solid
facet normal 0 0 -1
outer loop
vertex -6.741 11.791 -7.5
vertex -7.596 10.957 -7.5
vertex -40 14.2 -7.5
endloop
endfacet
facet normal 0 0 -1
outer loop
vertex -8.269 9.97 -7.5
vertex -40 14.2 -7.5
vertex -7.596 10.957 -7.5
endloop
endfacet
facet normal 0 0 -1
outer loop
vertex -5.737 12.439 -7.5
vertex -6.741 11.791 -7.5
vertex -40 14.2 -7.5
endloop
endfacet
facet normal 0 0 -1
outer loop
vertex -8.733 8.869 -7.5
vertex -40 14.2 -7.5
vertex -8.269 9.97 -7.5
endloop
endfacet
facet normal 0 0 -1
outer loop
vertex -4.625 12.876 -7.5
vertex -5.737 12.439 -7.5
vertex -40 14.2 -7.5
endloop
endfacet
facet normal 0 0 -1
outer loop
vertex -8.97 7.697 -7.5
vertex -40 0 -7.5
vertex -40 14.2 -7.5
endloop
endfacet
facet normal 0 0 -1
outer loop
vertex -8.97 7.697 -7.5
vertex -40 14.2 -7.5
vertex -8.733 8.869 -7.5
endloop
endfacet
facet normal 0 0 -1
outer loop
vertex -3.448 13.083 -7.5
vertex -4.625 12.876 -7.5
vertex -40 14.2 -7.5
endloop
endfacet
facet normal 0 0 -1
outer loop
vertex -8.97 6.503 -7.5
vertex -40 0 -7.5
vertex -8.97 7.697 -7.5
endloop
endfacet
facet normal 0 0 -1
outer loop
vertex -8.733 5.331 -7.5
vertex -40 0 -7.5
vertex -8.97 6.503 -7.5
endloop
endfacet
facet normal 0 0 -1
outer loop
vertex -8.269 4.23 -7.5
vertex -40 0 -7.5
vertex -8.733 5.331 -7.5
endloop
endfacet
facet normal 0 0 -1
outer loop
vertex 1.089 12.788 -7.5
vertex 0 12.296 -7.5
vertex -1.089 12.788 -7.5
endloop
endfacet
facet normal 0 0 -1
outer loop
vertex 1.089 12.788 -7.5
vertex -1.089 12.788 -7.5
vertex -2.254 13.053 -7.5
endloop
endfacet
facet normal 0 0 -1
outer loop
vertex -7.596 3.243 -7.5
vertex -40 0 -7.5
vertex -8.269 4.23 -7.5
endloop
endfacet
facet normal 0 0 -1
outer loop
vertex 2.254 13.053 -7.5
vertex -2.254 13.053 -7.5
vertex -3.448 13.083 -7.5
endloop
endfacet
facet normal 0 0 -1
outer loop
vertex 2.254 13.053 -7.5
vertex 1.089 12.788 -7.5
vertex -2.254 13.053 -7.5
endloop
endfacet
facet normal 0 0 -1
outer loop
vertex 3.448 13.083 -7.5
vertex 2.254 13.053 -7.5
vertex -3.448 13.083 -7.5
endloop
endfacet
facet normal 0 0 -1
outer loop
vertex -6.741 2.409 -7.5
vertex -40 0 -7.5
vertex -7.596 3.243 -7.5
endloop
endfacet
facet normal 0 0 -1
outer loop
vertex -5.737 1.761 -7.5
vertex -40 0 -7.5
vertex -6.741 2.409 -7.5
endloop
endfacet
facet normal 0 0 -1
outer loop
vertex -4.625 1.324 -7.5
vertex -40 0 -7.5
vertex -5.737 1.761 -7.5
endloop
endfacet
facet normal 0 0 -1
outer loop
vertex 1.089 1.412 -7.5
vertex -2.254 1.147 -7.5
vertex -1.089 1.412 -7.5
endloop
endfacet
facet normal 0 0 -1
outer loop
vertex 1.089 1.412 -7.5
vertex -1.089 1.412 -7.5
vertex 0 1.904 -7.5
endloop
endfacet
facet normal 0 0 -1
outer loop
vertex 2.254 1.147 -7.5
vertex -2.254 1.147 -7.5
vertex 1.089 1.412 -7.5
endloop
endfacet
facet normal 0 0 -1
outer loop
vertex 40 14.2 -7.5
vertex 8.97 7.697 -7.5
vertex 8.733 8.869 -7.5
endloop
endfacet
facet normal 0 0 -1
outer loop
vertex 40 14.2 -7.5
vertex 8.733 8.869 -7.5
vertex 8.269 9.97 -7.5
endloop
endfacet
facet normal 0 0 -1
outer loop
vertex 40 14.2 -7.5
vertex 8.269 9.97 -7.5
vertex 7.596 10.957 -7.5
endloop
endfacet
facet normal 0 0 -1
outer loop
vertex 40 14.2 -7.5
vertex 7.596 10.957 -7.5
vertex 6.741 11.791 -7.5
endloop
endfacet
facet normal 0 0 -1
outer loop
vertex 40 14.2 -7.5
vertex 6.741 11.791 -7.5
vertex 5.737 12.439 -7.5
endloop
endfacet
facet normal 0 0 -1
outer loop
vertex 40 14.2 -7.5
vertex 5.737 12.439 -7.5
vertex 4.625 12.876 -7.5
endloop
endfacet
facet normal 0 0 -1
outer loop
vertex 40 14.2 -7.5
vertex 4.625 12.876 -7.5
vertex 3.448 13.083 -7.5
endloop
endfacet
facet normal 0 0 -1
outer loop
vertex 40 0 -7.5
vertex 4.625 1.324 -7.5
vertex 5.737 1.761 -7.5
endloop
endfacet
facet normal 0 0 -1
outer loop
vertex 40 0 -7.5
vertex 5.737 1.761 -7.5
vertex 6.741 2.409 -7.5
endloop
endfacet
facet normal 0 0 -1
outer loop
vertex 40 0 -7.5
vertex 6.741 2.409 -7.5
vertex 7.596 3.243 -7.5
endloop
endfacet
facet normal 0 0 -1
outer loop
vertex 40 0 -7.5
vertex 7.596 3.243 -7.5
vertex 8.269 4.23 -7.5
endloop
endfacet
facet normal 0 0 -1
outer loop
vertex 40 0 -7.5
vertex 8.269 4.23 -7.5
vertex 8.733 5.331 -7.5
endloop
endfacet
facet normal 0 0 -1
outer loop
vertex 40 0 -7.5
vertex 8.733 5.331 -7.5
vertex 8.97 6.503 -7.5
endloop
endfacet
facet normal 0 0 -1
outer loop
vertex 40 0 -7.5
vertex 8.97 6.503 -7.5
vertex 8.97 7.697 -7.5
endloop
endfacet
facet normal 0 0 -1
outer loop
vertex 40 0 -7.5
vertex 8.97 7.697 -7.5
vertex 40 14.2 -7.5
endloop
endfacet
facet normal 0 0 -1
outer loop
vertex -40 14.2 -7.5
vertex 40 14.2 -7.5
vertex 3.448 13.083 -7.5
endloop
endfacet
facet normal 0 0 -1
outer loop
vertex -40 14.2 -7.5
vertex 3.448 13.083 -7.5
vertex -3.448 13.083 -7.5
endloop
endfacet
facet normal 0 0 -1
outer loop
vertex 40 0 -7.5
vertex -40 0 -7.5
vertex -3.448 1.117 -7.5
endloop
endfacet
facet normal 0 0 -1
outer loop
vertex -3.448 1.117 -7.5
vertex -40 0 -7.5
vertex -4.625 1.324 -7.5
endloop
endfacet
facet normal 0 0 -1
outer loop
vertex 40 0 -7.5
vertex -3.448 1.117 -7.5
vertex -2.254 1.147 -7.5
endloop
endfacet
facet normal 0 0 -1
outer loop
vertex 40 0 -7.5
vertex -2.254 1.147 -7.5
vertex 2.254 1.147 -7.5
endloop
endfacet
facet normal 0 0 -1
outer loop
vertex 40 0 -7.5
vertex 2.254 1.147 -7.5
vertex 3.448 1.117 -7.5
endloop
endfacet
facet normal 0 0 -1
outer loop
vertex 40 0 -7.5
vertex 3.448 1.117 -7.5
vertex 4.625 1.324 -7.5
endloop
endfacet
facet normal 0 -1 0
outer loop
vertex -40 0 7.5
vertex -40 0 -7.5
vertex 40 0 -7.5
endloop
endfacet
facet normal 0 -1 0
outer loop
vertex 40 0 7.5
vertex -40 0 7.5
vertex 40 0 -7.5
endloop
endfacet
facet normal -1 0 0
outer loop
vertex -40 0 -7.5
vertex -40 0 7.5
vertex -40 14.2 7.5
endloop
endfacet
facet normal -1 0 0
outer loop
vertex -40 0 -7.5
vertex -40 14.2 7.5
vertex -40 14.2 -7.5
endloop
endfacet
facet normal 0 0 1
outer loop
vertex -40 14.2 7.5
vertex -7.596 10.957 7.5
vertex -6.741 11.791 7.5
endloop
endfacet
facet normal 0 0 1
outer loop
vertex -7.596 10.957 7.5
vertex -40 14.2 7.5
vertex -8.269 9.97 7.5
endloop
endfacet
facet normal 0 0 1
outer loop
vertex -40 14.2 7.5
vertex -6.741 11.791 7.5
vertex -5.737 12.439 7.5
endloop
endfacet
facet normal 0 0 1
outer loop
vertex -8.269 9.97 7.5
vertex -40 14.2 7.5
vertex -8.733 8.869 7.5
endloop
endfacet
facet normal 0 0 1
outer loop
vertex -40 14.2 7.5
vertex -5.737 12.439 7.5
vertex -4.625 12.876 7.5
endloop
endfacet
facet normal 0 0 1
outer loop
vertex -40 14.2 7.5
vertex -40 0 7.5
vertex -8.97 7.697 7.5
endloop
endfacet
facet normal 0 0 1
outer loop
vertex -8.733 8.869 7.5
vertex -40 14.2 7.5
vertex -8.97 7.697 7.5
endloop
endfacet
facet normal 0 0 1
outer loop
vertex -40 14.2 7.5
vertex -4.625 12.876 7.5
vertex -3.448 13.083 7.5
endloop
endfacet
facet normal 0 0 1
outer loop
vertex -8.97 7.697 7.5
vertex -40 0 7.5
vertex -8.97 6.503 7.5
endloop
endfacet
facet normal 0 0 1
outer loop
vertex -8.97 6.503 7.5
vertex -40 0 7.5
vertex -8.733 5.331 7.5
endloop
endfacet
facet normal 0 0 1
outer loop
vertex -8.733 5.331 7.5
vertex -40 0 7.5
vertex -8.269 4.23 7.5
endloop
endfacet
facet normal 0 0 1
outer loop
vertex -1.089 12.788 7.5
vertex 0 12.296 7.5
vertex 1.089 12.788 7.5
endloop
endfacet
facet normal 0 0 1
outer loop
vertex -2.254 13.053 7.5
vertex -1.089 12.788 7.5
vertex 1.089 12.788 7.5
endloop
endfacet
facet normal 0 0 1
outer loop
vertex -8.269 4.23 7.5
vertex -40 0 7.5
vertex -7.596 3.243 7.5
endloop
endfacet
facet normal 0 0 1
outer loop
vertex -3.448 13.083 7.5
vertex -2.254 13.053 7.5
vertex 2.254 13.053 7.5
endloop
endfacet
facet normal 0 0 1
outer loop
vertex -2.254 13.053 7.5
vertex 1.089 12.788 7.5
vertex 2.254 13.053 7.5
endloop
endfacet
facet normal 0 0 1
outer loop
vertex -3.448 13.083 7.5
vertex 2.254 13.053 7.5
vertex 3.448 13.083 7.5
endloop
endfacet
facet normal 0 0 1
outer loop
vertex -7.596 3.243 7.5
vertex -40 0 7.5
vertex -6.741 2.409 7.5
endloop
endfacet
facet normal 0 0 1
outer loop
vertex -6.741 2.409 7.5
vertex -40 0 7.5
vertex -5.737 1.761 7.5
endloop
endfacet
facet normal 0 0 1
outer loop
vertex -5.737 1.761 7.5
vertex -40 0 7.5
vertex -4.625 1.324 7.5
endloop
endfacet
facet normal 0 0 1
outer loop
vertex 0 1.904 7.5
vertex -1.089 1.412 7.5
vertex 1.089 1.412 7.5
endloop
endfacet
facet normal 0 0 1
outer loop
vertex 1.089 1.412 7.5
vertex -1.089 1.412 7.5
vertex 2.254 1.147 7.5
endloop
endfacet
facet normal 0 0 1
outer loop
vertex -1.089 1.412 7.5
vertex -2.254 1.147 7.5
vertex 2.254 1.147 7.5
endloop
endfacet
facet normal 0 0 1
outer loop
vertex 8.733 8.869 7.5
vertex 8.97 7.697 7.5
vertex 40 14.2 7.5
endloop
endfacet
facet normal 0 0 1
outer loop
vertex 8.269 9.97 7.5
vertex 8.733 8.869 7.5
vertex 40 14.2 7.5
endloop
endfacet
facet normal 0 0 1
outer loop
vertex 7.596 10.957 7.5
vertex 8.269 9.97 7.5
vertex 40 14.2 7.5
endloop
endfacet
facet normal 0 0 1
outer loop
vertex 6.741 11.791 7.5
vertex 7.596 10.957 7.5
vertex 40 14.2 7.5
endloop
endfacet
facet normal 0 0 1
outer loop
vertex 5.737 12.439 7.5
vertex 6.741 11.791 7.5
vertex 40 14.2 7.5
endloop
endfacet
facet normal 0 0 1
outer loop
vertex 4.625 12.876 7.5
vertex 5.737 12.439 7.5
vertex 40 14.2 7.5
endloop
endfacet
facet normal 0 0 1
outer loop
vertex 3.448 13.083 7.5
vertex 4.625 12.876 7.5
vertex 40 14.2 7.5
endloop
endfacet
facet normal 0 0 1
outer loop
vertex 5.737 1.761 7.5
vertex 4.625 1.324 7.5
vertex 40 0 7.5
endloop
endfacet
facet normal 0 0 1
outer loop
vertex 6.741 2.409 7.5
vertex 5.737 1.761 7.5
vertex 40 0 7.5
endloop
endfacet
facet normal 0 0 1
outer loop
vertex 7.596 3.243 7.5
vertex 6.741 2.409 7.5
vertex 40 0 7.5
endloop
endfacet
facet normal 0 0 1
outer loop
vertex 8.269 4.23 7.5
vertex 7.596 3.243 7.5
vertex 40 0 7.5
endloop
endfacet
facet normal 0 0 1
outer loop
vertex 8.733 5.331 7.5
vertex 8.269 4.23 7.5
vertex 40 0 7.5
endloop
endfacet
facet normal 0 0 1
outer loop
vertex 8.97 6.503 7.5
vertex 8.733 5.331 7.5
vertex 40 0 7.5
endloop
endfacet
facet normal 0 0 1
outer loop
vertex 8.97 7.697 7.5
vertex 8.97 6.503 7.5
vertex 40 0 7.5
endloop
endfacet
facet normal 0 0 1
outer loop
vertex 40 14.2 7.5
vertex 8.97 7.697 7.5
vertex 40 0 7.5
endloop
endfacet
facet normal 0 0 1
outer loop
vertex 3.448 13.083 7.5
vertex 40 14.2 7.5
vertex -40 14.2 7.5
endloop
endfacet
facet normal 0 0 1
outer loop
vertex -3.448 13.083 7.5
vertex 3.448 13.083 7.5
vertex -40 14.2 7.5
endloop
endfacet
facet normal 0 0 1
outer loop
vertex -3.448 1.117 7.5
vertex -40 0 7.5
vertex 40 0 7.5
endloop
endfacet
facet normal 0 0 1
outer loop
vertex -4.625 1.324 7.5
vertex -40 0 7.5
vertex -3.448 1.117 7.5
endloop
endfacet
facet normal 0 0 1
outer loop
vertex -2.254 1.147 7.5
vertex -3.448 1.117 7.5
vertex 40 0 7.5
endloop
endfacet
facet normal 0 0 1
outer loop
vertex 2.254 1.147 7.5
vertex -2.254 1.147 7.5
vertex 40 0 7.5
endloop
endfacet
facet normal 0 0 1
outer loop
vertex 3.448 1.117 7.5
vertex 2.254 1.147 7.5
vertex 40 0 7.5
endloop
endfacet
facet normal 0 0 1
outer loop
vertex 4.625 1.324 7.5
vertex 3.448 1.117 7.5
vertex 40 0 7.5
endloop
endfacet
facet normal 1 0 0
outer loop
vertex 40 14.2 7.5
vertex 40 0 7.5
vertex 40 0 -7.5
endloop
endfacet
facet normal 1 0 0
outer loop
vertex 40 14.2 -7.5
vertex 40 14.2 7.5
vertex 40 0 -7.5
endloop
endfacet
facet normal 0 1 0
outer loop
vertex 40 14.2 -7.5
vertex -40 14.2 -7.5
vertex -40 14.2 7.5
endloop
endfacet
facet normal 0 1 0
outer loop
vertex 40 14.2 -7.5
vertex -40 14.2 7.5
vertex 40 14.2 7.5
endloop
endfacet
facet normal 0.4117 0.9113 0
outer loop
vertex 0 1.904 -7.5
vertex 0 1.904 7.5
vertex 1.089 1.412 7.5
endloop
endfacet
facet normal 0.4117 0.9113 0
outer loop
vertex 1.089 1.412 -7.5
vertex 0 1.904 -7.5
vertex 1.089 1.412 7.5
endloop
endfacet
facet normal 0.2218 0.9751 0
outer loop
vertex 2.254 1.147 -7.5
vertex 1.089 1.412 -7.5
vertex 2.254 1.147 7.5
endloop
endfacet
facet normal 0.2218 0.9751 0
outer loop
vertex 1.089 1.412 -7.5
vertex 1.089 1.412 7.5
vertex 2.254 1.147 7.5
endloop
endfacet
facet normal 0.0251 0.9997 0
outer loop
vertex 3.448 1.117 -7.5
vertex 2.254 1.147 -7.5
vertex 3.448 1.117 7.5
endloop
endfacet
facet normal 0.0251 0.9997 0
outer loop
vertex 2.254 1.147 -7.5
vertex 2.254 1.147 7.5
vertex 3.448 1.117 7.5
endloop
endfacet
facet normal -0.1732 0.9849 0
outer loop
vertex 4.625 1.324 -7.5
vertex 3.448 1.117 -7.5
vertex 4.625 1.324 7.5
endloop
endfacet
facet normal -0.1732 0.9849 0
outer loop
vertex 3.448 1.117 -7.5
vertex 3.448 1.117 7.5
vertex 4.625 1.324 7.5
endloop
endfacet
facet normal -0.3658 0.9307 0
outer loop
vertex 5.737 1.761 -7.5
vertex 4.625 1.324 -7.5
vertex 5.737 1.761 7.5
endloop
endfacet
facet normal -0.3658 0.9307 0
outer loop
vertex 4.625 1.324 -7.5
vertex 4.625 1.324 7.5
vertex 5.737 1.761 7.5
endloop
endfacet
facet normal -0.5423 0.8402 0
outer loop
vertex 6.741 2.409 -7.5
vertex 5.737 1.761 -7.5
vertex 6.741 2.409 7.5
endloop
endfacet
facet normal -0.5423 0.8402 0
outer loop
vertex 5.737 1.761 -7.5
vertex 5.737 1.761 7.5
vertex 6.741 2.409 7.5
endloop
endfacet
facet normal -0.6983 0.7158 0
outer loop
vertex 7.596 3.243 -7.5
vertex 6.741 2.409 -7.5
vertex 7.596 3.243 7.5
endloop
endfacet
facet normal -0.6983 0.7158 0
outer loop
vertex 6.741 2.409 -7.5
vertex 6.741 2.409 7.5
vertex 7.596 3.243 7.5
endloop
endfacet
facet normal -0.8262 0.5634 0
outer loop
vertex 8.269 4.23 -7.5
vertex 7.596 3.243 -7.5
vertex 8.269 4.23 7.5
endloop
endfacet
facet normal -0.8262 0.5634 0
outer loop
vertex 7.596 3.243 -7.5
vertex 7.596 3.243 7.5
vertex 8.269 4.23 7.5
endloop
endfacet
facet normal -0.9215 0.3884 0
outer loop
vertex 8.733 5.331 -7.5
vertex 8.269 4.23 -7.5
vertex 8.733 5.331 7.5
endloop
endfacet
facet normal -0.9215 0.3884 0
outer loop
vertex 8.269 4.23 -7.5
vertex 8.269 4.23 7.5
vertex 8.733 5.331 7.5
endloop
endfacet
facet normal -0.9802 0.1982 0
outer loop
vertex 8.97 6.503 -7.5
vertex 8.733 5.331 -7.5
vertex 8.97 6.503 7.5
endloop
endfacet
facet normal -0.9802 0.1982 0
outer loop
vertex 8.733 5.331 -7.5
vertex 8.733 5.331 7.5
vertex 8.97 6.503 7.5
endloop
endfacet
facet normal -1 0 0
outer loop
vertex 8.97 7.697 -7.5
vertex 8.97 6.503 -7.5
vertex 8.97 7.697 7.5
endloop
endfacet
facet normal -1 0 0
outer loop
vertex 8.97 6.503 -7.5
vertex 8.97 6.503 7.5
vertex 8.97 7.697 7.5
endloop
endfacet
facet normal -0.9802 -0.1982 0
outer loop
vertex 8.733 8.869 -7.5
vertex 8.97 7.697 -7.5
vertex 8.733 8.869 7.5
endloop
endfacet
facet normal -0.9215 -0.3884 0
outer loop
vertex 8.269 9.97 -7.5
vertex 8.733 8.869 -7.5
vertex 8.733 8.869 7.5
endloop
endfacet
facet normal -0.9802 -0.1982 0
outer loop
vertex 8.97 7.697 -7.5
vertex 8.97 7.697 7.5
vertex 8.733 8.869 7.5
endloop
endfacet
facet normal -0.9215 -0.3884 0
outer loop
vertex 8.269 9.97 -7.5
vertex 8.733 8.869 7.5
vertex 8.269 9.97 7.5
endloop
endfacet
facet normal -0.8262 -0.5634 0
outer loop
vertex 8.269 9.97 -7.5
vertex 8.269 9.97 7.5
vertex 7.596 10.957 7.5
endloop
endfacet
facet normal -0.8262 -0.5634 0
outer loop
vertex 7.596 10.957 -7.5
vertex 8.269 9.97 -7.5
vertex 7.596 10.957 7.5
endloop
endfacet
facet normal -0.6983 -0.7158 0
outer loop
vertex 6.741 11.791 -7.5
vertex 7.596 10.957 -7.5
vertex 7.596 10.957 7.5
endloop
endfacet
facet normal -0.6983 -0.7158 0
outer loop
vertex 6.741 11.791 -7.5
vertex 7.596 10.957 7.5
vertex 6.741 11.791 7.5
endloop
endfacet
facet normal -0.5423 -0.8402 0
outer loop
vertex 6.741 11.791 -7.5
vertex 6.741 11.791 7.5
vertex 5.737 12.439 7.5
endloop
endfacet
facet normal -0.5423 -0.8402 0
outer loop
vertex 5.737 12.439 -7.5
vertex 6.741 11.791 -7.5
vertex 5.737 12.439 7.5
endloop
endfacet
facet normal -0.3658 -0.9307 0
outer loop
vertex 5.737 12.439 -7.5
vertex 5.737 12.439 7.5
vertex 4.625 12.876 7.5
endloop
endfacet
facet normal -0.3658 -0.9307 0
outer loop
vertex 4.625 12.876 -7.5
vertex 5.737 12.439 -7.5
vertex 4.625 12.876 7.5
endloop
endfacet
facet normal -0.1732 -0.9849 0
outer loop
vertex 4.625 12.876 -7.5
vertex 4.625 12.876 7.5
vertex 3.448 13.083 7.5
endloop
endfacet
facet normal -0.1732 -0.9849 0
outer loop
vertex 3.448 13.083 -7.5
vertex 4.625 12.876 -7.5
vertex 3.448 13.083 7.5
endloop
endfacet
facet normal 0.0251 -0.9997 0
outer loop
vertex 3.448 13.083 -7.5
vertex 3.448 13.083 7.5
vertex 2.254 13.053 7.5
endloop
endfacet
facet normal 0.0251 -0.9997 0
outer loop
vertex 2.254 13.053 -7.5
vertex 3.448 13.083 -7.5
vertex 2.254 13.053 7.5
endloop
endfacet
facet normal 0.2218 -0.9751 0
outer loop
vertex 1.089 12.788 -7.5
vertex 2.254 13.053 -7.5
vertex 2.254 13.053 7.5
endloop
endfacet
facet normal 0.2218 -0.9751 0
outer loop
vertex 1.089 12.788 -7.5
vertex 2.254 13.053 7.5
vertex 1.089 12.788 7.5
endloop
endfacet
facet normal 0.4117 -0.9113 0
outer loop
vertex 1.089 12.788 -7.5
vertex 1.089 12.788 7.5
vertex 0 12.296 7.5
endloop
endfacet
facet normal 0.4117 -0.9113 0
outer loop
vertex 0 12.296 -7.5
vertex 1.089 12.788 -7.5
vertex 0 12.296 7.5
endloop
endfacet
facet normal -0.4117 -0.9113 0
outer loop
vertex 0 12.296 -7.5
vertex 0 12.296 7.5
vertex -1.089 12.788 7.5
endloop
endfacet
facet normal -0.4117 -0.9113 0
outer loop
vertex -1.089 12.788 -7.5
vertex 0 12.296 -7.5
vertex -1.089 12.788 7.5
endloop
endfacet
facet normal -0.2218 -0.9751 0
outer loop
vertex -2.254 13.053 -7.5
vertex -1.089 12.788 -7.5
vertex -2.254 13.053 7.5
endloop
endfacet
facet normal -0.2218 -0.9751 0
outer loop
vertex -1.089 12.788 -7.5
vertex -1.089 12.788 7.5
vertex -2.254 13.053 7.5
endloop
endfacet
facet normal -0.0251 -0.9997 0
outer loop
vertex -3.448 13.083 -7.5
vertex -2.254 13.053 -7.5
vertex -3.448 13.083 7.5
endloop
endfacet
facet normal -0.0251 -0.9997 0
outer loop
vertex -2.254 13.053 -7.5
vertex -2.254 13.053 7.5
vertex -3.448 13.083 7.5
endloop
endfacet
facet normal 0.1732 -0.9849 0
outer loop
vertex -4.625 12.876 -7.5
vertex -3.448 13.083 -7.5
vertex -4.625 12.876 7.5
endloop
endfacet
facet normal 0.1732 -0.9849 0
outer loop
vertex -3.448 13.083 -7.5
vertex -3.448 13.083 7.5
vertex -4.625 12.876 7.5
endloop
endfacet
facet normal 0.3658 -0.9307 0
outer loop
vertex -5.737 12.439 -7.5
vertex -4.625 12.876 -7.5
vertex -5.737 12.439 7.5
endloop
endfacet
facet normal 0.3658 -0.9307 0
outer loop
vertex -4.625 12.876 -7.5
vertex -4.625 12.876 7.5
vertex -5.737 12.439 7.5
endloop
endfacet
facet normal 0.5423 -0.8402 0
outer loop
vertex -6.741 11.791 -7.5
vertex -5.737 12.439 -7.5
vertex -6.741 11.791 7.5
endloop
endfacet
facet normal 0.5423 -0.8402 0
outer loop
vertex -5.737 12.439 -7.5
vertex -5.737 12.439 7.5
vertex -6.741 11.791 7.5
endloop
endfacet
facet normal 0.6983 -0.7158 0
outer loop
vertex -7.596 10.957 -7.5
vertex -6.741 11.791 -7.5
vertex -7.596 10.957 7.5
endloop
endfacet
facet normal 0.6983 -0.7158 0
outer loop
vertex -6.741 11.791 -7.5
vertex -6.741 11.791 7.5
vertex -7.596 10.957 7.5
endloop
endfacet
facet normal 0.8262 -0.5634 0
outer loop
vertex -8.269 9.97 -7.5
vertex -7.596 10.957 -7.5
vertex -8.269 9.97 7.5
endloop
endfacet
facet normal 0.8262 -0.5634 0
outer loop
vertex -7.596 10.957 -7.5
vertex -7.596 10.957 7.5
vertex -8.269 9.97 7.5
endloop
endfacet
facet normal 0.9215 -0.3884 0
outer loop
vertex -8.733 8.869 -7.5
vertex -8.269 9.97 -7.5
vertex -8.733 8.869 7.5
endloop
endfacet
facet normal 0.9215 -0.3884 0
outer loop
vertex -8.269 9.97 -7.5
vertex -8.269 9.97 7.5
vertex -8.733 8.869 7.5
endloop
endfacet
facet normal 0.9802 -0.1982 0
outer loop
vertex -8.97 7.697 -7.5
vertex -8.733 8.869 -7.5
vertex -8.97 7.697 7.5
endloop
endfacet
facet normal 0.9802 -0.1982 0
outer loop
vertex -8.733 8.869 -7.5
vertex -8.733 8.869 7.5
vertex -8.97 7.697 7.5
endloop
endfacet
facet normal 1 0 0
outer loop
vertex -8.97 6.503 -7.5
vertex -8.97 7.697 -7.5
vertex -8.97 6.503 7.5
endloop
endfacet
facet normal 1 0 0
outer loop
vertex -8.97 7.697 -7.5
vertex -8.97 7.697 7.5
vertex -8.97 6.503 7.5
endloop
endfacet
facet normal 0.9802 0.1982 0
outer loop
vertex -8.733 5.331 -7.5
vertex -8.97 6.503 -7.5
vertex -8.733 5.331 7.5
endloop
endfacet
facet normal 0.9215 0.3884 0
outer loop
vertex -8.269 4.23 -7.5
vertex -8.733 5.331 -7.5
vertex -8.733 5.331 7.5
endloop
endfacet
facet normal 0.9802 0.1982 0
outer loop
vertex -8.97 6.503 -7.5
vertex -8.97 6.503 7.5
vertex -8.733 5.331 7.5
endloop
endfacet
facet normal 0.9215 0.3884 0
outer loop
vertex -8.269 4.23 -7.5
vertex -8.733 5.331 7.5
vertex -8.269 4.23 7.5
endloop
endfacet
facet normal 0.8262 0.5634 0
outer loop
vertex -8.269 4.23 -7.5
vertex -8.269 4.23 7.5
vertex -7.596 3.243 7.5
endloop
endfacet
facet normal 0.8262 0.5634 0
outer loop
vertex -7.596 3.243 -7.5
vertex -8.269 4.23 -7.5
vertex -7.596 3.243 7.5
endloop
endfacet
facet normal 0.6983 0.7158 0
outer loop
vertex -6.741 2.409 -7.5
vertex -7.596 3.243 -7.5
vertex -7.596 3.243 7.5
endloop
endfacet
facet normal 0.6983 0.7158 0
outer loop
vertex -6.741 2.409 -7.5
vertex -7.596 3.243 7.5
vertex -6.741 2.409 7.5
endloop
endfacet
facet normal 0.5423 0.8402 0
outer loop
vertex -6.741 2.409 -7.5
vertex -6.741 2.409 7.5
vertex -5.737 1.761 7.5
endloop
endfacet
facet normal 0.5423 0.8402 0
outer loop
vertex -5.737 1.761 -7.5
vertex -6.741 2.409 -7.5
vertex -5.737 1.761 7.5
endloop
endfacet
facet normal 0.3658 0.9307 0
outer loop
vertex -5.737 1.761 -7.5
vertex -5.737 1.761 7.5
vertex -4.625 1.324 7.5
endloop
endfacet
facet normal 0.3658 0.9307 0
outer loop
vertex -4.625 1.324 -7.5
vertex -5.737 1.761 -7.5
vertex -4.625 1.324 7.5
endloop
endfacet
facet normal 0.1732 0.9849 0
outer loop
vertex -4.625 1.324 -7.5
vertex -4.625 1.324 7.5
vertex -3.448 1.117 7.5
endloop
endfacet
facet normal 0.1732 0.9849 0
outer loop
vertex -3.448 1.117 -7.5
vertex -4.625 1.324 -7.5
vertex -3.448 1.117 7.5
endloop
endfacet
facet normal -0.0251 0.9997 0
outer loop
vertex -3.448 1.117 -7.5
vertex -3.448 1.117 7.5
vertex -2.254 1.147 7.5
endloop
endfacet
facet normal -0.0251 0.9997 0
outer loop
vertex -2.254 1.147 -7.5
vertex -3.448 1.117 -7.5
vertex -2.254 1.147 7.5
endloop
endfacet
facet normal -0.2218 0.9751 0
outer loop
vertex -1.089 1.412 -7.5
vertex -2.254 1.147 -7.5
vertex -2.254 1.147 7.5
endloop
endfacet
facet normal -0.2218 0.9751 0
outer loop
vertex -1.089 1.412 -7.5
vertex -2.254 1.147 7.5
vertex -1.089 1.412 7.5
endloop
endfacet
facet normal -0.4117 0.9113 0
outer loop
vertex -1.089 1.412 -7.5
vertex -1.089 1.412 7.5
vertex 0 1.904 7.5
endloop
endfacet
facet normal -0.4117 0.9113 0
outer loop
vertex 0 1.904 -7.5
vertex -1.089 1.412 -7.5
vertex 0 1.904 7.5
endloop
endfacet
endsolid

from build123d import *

# Parameters (mm, degrees)
SKETCH1_W           = 80
SKETCH1_H           = 15
BOSS_EXTRUDE1_DEPTH = 14.2
CUT_EXTRUDE1_DEPTH  = 46.018218534


with BuildPart() as part:
    # Sketch1 → Boss-Extrude1 (new body)
    with BuildSketch(Plane(origin=(0, 0, 0), x_dir=(1, 0, 0), z_dir=(0, 1, 0))):
        Rectangle(SKETCH1_W, SKETCH1_H)
    extrude(amount=BOSS_EXTRUDE1_DEPTH)

    # Sketch4 → Cut-Extrude1 (cut, through all)
    with BuildSketch(Plane.XY.offset(7.5)):
        with BuildLine():
            ThreePointArc((0, 1.903847577), (9, 7.1), (0, 12.296152423))
            ThreePointArc((0, 12.296152423), (-9, 7.1), (0, 1.903847577))
        make_face()
    extrude(amount=-CUT_EXTRUDE1_DEPTH, mode=Mode.SUBTRACT)


solid = part.part
